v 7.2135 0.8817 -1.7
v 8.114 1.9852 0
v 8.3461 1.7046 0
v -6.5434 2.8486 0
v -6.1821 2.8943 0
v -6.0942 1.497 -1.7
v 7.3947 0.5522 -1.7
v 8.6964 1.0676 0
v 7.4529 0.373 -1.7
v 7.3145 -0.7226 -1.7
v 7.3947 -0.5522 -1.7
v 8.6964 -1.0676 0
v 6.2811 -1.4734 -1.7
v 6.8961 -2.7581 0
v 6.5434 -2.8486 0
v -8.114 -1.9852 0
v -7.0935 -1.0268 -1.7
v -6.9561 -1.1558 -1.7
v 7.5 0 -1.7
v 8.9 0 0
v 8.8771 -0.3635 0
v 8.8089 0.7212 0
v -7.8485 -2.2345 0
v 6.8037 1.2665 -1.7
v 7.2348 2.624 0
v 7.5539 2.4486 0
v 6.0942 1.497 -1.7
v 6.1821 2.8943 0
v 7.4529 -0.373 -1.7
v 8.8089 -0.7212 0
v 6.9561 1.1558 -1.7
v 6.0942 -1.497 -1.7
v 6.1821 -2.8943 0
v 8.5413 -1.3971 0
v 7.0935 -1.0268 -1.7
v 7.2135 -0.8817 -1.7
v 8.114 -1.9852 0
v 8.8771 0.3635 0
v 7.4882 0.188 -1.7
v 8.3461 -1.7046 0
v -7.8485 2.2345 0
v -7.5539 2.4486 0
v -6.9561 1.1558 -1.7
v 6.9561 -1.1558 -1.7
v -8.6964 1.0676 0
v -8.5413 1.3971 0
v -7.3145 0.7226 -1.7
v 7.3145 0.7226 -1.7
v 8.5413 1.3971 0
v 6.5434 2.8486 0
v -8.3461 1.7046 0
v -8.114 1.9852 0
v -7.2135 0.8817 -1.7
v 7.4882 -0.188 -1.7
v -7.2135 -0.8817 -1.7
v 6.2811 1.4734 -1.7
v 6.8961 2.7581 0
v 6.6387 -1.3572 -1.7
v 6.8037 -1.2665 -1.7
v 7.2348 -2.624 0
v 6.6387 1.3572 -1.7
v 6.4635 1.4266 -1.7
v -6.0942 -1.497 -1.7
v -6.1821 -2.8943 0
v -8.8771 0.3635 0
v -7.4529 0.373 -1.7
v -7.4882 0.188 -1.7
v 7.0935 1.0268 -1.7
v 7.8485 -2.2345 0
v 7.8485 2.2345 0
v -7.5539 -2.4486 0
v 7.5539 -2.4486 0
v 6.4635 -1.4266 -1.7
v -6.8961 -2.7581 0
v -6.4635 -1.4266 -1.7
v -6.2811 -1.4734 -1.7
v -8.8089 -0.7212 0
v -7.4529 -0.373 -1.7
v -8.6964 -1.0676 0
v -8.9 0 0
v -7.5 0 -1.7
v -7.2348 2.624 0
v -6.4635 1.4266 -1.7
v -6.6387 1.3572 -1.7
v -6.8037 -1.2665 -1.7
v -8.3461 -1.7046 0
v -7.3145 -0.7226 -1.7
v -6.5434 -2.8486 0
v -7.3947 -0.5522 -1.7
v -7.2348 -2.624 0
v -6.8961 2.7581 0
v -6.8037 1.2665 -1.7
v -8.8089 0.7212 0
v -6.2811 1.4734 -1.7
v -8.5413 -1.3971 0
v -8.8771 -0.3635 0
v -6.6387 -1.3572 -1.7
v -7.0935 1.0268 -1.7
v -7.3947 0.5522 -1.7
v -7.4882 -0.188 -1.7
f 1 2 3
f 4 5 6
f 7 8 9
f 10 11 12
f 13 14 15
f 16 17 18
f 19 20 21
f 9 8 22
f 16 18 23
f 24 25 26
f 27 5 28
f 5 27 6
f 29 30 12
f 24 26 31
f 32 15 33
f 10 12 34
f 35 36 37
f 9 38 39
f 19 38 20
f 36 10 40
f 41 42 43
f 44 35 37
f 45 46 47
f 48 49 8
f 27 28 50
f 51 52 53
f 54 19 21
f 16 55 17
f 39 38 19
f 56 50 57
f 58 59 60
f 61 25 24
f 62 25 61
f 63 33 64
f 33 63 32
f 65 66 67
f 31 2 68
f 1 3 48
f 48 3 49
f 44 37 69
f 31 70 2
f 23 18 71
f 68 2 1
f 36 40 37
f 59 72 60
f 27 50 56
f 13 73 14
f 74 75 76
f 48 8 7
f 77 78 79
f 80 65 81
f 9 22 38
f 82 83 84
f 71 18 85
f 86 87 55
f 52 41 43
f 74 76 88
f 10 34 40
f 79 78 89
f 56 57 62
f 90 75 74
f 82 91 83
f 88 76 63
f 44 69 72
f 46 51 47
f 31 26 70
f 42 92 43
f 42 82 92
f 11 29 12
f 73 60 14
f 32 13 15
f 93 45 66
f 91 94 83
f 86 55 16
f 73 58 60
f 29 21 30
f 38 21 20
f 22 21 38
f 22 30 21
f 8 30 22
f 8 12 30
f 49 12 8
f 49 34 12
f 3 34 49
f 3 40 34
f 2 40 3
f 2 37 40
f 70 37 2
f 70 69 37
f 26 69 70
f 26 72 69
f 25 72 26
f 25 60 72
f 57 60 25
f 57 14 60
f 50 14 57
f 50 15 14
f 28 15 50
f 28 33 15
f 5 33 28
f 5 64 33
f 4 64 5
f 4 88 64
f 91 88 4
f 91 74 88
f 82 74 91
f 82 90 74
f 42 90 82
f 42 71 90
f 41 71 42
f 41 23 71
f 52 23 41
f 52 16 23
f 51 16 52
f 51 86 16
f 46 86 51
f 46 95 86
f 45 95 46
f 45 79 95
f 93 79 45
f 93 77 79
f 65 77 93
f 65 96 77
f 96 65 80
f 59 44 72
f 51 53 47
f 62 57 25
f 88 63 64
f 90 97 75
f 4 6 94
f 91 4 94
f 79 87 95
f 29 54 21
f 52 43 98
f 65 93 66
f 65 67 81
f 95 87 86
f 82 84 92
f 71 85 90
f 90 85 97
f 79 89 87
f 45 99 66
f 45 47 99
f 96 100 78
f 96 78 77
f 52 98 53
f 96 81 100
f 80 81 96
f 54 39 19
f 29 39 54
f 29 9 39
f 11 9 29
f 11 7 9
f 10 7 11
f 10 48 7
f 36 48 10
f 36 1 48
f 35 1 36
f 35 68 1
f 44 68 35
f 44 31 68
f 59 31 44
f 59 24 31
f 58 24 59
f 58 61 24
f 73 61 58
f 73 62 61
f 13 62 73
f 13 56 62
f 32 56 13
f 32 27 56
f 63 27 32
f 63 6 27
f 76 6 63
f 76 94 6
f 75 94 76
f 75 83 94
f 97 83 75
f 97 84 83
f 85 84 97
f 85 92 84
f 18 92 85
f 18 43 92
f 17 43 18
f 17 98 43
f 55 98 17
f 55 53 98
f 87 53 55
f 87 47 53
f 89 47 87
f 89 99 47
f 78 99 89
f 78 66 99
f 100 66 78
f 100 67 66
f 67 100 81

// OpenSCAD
$fn = 50;

difference() {
	union() {
		translate(v = [0, 0, 0]) {
			rotate(a = [0, 0, 0]) {
				difference() {
					union() {
						translate(v = [0, 0, 0]) {
							rotate(a = [0, 0, 0]) {
								hull() {
									difference() {
										union() {
											translate(v = [-6.0, 0, 0]) {
												rotate(a = [0, 0, 0]) {
													difference() {
														union() {
															translate(v = [0, 0, -1.7]) {
																cylinder(h = 1.7, r1 = 1.5, r2 = 2.9);
															}
														}
														union();
													}
												}
											}
											translate(v = [6.0, 0, 0]) {
												rotate(a = [0, 0, 0]) {
													difference() {
														union() {
															translate(v = [0, 0, -1.7]) {
																cylinder(h = 1.7, r1 = 1.5, r2 = 2.9);
															}
														}
														union();
													}
												}
											}
										}
										union();
									}
								}
							}
						}
					}
					union();
				}
			}
		}
	}
	union();
}
